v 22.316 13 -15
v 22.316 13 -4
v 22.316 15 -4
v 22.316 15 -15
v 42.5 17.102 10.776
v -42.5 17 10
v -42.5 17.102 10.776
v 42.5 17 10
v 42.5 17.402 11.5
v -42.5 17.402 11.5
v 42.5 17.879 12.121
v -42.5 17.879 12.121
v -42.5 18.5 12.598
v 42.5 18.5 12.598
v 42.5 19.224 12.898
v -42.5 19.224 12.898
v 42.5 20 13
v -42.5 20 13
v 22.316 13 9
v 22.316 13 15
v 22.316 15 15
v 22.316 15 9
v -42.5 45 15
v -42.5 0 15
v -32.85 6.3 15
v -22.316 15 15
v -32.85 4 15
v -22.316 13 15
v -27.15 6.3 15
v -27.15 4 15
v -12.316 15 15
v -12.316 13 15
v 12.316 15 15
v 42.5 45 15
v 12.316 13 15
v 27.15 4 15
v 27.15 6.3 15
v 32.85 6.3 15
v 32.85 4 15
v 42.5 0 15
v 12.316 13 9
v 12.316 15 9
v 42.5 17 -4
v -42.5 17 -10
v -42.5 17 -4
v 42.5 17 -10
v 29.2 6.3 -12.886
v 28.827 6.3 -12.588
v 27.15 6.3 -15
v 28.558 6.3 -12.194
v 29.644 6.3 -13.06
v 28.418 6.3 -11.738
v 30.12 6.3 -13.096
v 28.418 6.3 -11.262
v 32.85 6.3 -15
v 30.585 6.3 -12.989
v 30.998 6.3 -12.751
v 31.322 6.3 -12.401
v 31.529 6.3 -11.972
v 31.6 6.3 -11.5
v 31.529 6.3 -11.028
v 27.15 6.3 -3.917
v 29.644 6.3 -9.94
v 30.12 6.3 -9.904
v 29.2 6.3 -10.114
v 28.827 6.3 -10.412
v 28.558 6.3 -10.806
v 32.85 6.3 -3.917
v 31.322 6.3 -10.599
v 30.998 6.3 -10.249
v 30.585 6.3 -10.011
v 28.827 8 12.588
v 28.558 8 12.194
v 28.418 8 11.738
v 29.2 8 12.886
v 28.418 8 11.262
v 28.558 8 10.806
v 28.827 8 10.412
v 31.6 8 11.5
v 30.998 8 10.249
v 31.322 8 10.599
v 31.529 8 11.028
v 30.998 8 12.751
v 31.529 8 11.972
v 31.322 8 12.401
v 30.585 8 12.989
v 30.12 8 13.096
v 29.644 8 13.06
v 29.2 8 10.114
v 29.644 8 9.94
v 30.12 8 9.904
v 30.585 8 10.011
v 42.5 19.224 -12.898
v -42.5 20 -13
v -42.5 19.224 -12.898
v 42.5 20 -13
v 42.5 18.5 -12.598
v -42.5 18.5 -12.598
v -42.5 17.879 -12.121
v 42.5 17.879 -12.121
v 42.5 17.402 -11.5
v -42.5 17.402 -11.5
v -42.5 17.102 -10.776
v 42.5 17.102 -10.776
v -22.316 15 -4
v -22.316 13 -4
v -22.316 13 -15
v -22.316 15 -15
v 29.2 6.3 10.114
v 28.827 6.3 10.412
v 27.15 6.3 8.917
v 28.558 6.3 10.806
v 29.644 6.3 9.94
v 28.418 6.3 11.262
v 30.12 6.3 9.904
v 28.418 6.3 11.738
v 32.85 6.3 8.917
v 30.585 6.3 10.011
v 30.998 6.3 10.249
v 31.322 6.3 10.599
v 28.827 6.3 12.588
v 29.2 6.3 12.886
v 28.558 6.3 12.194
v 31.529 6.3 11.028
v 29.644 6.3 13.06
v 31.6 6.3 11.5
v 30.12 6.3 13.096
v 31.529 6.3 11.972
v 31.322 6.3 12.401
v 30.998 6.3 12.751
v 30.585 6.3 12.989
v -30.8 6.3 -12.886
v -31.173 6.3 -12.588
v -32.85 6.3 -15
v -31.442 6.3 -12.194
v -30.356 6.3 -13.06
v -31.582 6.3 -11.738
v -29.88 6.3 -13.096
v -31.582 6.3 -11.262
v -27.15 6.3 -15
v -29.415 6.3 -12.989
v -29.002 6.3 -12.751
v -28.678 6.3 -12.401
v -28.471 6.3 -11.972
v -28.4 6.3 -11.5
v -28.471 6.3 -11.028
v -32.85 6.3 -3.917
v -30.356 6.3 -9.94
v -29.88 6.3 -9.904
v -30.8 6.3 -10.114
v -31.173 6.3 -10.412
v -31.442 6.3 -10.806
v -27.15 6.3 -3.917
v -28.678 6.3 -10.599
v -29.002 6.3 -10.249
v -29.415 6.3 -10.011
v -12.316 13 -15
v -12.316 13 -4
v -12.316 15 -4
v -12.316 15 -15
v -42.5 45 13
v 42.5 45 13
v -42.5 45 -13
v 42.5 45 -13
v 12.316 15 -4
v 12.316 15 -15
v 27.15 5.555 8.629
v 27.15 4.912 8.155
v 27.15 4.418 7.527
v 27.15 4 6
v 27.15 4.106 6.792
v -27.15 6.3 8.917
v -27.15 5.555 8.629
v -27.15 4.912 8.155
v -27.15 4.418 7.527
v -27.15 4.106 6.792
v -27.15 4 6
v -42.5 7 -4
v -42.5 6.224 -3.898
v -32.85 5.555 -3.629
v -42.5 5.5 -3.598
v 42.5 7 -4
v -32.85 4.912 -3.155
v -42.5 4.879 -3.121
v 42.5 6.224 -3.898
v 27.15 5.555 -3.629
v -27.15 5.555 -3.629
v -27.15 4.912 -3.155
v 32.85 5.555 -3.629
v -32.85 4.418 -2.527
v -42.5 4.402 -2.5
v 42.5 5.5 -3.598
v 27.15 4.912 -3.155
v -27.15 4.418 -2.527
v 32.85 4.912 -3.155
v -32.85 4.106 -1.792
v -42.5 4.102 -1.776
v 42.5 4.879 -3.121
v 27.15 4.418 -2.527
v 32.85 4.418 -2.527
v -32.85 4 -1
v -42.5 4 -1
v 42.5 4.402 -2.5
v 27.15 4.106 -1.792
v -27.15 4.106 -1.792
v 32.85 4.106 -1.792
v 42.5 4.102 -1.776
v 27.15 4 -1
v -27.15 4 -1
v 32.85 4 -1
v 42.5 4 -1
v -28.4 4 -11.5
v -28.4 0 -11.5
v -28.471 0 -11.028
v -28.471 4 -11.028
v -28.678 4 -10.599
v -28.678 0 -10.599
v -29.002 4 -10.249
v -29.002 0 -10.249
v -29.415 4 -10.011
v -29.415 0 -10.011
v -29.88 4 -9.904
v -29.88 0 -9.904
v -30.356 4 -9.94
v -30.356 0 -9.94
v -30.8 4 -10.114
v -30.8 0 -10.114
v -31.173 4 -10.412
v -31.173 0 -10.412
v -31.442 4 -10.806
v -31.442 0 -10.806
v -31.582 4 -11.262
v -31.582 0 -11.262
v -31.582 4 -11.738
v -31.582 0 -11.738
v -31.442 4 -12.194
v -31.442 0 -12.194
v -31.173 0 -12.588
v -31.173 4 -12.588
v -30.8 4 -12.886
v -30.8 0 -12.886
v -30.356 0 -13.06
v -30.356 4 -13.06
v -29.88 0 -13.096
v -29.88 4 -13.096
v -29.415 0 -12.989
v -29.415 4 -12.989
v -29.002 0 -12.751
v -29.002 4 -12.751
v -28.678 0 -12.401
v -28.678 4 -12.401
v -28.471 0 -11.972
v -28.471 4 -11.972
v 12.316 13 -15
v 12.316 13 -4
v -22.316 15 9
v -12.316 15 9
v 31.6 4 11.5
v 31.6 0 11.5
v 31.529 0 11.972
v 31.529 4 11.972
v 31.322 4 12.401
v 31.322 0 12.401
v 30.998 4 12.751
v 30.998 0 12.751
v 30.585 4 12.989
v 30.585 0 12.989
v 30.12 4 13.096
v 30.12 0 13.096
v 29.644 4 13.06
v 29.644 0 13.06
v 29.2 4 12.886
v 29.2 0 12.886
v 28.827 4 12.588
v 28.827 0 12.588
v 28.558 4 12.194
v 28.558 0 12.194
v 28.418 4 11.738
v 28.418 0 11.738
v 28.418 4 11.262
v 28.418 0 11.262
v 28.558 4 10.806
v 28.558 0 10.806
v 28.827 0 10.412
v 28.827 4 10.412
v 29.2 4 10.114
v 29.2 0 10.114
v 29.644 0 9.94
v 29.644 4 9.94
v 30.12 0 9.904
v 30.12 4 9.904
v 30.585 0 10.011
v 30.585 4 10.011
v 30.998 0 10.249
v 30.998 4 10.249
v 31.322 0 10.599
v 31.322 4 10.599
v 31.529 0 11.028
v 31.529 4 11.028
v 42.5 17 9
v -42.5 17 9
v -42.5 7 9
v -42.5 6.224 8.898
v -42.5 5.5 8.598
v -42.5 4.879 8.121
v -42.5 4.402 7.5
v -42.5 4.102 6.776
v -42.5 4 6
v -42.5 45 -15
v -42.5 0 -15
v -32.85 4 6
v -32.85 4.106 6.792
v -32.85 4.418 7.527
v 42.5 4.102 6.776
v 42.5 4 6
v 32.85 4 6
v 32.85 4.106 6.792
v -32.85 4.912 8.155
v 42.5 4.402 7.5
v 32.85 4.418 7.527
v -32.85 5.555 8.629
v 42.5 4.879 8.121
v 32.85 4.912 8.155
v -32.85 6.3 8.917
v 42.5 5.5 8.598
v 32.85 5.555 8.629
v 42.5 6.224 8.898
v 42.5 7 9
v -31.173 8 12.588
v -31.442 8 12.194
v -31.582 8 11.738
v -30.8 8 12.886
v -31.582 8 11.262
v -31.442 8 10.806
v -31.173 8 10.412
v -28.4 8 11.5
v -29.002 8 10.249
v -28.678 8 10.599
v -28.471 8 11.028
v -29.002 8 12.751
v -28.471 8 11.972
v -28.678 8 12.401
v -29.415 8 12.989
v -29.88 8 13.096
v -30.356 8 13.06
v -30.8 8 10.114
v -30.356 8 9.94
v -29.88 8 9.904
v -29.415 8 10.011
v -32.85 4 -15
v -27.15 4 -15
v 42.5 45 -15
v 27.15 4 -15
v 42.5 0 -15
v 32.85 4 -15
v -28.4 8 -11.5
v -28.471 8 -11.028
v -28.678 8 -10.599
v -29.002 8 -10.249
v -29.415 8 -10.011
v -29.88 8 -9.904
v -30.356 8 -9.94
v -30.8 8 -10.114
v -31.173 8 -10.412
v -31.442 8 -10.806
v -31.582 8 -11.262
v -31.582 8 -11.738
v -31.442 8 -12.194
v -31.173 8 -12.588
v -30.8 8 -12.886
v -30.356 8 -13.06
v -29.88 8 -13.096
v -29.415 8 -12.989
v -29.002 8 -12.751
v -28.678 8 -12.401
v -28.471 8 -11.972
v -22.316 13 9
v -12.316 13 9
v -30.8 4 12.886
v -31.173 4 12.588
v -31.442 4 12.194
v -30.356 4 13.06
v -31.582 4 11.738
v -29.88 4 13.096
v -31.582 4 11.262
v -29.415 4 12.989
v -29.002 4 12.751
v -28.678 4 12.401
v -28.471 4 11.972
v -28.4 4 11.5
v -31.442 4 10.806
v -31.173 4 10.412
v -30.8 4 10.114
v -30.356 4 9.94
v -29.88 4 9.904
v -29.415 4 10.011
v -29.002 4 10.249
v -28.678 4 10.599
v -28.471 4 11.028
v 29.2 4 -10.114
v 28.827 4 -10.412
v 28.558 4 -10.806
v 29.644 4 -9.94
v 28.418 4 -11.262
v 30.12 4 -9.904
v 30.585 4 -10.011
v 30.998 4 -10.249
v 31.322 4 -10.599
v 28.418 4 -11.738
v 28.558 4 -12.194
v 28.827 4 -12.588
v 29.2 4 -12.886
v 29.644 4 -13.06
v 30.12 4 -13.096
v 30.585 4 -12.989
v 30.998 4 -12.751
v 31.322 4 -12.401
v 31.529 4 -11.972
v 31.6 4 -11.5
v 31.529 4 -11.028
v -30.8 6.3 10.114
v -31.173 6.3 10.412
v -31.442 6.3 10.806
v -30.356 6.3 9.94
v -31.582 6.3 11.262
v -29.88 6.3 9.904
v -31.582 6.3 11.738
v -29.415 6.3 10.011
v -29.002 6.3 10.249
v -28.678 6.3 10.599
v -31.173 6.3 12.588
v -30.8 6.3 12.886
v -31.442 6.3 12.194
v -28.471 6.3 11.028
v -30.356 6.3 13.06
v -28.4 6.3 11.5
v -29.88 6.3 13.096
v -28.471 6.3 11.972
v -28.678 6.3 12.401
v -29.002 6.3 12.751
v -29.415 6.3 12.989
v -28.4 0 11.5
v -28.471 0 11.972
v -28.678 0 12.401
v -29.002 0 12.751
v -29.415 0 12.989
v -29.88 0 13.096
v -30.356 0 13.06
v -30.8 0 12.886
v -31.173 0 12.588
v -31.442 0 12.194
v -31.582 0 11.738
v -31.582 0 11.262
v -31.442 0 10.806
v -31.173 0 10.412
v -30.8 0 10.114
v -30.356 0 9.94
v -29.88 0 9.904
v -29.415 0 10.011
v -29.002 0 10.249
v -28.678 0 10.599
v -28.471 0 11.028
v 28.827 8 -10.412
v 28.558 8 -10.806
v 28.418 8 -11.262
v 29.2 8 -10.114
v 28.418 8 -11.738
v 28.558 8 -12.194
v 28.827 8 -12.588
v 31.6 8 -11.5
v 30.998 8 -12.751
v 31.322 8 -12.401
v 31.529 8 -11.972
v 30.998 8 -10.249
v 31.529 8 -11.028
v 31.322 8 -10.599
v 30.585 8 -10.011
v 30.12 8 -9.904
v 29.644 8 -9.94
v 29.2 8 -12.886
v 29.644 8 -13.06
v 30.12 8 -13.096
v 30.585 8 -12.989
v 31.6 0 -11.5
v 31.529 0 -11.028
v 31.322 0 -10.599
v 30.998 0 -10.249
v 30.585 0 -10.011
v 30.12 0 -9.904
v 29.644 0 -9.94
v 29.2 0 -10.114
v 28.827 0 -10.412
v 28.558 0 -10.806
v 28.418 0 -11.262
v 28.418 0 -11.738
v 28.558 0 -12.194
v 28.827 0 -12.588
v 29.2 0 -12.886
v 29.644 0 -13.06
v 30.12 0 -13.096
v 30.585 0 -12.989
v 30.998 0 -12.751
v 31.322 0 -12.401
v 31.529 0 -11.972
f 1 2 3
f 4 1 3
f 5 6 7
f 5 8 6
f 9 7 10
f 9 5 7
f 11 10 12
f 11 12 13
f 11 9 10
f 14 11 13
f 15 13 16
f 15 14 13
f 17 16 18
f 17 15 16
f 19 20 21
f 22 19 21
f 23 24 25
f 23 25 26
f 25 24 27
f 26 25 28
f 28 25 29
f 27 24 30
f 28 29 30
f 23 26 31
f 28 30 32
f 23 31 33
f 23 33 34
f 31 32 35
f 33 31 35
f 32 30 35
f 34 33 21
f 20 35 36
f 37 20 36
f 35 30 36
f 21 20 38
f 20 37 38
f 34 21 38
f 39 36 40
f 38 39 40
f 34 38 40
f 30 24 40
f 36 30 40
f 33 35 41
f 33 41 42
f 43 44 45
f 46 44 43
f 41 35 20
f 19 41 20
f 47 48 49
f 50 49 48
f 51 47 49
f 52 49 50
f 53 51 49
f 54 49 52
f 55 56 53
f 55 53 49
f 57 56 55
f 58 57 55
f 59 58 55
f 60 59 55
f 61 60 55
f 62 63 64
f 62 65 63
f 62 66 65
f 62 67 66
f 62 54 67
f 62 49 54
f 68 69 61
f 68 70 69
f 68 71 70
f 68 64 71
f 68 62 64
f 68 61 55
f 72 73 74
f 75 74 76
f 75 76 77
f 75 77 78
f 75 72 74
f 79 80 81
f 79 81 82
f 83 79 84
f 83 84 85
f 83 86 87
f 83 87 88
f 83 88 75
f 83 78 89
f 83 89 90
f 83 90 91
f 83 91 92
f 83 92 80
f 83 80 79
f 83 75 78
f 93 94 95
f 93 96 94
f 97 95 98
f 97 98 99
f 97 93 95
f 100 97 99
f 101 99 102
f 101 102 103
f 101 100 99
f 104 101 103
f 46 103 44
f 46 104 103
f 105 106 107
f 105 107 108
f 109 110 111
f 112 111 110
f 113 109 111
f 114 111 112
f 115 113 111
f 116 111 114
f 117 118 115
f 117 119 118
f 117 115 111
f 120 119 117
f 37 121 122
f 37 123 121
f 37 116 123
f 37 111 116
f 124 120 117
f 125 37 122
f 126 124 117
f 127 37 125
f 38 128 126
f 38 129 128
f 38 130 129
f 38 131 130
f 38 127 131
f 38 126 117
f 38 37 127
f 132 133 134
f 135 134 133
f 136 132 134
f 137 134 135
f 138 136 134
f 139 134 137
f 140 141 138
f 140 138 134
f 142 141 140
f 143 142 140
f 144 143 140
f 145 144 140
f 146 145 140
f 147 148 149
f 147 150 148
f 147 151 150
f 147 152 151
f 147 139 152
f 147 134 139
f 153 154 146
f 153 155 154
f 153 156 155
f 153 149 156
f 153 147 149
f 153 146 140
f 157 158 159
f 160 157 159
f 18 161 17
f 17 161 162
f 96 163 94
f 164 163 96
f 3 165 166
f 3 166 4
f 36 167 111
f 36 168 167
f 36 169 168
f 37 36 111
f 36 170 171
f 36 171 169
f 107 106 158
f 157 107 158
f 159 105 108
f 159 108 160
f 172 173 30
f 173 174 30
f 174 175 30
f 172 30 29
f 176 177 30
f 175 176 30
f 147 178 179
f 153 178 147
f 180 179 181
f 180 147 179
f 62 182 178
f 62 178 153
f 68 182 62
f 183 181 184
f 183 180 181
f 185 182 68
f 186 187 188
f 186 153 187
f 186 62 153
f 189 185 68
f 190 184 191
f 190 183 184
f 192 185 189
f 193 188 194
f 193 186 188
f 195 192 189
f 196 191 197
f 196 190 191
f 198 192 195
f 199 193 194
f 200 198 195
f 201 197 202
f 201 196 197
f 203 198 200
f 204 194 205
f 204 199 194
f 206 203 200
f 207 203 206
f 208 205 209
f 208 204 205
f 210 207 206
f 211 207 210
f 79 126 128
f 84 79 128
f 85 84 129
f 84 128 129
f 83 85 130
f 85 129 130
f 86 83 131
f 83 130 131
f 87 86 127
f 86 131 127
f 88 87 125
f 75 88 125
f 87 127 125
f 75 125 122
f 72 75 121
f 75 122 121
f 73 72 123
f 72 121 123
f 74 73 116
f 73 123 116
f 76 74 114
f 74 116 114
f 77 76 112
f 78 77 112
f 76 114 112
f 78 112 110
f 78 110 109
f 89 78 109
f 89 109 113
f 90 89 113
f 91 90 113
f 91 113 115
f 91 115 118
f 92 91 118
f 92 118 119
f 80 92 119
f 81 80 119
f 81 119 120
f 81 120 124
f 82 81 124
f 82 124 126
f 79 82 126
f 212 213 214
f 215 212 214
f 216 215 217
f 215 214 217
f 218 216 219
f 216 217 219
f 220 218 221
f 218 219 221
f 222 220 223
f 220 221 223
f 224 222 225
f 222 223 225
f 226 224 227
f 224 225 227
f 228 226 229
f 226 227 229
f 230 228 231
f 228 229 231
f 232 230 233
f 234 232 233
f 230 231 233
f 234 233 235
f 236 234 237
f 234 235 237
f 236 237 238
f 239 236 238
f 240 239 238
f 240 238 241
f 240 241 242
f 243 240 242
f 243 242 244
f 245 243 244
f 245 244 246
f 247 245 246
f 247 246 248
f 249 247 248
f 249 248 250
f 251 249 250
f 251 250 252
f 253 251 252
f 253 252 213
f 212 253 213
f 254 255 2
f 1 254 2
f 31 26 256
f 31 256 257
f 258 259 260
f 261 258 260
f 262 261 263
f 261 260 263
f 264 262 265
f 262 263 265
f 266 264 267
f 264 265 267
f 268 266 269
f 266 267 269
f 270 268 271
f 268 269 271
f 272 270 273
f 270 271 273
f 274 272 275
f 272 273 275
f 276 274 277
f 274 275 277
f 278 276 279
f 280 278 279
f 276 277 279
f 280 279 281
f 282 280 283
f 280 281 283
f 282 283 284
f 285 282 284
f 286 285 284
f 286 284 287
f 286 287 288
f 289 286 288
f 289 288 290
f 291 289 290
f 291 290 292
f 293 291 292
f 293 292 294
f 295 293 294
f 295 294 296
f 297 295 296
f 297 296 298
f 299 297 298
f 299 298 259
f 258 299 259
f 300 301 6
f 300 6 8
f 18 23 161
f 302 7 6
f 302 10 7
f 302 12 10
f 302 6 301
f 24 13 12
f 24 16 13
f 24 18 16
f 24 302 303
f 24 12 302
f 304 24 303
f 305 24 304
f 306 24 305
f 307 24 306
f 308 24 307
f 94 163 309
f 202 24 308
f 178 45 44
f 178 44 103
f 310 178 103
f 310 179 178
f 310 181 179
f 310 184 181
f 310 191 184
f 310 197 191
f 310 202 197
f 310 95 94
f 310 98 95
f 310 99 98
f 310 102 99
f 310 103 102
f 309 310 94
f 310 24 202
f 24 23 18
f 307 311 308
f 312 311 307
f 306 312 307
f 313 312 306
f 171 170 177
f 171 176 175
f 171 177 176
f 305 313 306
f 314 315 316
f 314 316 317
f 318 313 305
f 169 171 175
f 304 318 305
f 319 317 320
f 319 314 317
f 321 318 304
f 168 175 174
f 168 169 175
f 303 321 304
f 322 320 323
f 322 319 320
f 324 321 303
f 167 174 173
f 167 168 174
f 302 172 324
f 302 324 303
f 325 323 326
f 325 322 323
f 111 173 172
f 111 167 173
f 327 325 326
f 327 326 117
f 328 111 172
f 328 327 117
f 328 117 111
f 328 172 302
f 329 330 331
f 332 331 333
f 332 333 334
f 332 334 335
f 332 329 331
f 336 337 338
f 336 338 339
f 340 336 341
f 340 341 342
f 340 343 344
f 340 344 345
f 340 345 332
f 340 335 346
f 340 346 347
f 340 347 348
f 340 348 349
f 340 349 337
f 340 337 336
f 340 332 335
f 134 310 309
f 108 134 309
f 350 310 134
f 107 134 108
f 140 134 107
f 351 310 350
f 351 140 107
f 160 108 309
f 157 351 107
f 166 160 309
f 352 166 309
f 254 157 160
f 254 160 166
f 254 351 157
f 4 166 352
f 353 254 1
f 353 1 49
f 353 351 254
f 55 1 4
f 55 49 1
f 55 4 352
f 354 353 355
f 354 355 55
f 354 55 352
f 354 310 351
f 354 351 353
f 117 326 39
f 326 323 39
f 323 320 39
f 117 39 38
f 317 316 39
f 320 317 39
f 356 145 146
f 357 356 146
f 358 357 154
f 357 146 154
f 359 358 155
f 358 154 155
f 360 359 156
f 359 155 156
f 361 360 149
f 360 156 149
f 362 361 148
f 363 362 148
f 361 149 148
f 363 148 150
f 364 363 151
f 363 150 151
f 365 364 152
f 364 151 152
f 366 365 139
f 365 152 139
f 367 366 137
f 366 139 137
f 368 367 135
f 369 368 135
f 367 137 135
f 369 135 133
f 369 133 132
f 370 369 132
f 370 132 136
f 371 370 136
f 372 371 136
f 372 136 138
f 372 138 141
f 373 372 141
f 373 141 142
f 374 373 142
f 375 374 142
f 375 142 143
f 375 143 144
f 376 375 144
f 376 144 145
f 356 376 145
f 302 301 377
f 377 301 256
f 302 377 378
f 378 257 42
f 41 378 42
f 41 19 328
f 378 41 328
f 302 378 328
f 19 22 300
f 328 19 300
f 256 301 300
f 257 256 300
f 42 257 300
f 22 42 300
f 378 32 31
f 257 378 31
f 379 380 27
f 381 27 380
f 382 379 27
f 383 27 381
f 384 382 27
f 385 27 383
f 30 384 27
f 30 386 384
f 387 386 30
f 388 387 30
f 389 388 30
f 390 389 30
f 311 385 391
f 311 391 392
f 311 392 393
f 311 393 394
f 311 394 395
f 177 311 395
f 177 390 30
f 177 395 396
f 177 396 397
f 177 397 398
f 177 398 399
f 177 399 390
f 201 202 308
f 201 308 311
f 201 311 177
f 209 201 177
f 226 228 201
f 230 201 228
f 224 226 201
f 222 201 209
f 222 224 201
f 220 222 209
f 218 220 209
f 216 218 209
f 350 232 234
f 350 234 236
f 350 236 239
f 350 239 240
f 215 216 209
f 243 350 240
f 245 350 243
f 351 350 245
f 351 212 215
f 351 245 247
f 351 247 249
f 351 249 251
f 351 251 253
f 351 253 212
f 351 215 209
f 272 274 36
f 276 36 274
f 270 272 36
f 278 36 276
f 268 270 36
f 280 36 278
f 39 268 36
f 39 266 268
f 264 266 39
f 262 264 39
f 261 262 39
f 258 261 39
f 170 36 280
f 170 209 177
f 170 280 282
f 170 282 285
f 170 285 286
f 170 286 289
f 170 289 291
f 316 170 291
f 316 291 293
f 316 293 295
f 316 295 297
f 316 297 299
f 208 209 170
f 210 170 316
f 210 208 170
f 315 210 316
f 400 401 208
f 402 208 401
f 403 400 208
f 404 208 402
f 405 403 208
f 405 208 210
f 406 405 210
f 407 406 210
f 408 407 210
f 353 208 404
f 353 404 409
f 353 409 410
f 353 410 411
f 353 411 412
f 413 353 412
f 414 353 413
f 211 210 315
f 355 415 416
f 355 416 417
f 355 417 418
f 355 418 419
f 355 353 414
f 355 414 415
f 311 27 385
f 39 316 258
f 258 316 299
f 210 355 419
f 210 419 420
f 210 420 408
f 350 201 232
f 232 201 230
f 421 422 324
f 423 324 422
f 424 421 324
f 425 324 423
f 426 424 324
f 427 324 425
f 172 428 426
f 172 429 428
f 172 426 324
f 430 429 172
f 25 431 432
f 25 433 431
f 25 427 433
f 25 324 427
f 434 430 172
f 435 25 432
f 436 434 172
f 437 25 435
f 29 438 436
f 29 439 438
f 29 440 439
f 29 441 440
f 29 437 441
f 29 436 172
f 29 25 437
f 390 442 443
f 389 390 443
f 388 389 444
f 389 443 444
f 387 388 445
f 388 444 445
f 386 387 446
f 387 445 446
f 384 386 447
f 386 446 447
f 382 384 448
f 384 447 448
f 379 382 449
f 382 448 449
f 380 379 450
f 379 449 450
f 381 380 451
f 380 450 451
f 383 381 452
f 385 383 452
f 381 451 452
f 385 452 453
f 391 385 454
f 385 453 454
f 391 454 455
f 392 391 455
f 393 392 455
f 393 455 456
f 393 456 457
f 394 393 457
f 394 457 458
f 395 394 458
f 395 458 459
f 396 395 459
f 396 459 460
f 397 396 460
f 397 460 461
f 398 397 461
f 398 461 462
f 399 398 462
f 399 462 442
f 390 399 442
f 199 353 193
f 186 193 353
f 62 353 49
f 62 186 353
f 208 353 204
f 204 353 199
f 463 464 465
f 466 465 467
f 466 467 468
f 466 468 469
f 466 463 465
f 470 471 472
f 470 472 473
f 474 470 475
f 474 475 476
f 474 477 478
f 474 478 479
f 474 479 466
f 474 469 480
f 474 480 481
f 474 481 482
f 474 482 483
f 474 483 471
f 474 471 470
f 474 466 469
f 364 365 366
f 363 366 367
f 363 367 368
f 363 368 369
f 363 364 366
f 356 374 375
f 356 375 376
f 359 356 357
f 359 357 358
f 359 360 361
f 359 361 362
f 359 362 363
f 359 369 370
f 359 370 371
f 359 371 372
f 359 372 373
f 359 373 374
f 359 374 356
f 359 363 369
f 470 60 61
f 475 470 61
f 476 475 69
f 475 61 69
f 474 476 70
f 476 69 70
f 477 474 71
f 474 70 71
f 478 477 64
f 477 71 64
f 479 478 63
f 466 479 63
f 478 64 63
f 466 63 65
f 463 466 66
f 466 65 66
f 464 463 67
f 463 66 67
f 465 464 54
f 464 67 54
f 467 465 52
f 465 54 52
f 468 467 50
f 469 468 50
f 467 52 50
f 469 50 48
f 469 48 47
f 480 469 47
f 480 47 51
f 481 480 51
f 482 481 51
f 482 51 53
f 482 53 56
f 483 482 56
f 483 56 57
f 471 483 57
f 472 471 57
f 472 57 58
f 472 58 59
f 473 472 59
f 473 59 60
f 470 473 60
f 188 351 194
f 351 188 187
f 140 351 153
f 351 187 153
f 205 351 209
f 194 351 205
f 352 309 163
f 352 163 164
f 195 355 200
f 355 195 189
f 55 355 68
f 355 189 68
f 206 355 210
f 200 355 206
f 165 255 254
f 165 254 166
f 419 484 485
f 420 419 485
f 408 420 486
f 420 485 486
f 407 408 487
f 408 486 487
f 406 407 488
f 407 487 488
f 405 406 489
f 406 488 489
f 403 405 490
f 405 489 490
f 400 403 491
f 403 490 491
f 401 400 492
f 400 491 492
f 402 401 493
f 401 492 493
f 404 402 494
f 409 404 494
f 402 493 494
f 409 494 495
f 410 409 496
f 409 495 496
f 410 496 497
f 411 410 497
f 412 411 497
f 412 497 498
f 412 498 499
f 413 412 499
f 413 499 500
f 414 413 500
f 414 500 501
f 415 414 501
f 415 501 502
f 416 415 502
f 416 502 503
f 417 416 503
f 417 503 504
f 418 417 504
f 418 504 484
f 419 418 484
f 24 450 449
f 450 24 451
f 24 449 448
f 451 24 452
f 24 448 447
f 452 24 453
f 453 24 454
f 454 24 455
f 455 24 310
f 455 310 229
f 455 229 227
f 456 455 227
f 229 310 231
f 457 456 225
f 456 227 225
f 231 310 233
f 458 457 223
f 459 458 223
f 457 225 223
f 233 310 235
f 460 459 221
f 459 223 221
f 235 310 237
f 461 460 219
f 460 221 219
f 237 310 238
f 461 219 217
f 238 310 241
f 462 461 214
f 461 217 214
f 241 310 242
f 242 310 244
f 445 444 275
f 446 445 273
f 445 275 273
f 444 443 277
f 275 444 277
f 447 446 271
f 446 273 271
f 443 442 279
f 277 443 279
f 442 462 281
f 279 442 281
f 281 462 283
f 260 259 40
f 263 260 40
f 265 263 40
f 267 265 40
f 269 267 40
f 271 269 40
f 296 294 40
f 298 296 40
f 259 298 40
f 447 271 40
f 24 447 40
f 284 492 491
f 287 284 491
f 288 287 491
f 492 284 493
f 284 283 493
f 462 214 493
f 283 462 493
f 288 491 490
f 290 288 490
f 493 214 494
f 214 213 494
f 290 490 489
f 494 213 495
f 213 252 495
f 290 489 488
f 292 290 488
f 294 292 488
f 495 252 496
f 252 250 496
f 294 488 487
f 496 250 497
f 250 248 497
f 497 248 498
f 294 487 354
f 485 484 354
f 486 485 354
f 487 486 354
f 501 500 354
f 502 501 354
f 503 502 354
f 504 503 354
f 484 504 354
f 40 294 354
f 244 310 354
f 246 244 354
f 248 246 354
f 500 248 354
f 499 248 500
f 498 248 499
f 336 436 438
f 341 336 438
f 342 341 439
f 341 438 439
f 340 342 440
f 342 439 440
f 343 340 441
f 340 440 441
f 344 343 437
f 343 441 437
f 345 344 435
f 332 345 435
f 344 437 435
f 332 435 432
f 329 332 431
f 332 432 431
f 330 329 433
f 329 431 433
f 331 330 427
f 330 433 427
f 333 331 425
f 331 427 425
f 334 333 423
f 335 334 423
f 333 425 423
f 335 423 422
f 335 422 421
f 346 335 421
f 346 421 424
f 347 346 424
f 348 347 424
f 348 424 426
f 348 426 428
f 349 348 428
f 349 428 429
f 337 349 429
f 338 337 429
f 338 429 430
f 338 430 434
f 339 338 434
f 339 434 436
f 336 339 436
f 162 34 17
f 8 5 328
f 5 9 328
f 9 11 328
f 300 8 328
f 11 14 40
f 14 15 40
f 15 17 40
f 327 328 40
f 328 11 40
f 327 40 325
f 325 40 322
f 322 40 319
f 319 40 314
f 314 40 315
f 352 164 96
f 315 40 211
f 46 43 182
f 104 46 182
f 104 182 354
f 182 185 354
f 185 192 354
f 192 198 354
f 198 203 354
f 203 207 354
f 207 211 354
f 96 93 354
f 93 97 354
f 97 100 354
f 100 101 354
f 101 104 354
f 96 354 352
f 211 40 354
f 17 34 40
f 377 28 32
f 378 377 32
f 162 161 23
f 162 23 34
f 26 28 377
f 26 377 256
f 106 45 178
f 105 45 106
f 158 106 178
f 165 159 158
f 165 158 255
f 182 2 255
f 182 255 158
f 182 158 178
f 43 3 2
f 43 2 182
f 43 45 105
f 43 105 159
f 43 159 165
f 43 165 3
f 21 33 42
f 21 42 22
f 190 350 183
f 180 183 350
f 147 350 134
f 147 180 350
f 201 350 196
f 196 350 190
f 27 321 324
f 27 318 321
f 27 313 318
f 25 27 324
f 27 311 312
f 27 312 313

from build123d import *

# Parameters (mm, degrees)
SKETCH_1_W          = 85
SKETCH_1_H          = 30
EXTRUDE_1_DEPTH     = 45
SKETCH_2_W          = 85
SKETCH_2_H          = 26
CUT_EXTRUDE_1_DEPTH = 28
SKETCH_3_W          = 85
SKETCH_3_H          = 13
CUT_EXTRUDE_3_DEPTH = 13
SKETCH_4_W          = 10
SKETCH_4_H          = 2
CUT_EXTRUDE_4_DEPTH = 31
FILLET_1_R          = 3
SKETCH_5_R          = 1.6
CUT_EXTRUDE_5_DEPTH = 8
SKETCH_6_W          = 5.7
SKETCH_6_H          = 2.3
CUT_EXTRUDE_6_DEPTH = 31


with BuildPart() as part:
    # 草图1 → 凸台-拉伸1 (new body)
    with BuildSketch(Plane(origin=(0, 0, 0), x_dir=(1, 0, 0), z_dir=(0, 1, 0))):
        Rectangle(SKETCH_1_W, SKETCH_1_H)
    extrude(amount=EXTRUDE_1_DEPTH)

    # 草图2 → 切除-拉伸1 (cut)
    with BuildSketch(Plane(origin=(0, 45, 0), x_dir=(1, 0, 0), z_dir=(0, 1, 0))):
        Rectangle(SKETCH_2_W, SKETCH_2_H)
    extrude(amount=-CUT_EXTRUDE_1_DEPTH, mode=Mode.SUBTRACT)

    # 草图3 → 切除-拉伸3 (cut)
    with BuildSketch(Plane(origin=(0, 17, 0), x_dir=(1, 0, 0), z_dir=(0, 1, 0))):
        with Locations((0, -2.5)):
            Rectangle(SKETCH_3_W, SKETCH_3_H)
    extrude(amount=-CUT_EXTRUDE_3_DEPTH, mode=Mode.SUBTRACT)

    # 草图4 → 切除-拉伸4 (cut, through all)
    with BuildSketch(Plane.XY.offset(15)):
        with Locations((-17.315675278, 14)):
            Rectangle(SKETCH_4_W, SKETCH_4_H)
        with Locations((17.315675278, 14)):
            Rectangle(SKETCH_4_W, SKETCH_4_H)
    extrude(amount=-CUT_EXTRUDE_4_DEPTH, mode=Mode.SUBTRACT)

    # 圆角1
    fillet_1_edges = [part.edges().sort_by_distance(p)[0] for p in [
        (0, 17, 13),
        (0, 17, -13),
        (0, 4, -4),
        (0, 4, 9),
    ]]
    fillet(fillet_1_edges, radius=FILLET_1_R)

    # 草图5 → 切除-拉伸5 (cut)
    with BuildSketch(Plane.XZ):
        with Locations((-30, 11.5)):
            Circle(SKETCH_5_R)
        with Locations((-30, -11.5)):
            Circle(SKETCH_5_R)
        with Locations((30, -11.5)):
            Circle(SKETCH_5_R)
        with Locations((30, 11.5)):
            Circle(SKETCH_5_R)
    extrude(amount=-CUT_EXTRUDE_5_DEPTH, mode=Mode.SUBTRACT)

    # 草图6 → 切除-拉伸6 (cut, through all)
    with BuildSketch(Plane.XY.offset(15)):
        with Locations((-30, 5.15)):
            Rectangle(SKETCH_6_W, SKETCH_6_H)
        with Locations((30, 5.15)):
            Rectangle(SKETCH_6_W, SKETCH_6_H)
    extrude(amount=-CUT_EXTRUDE_6_DEPTH, mode=Mode.SUBTRACT)


solid = part.part
